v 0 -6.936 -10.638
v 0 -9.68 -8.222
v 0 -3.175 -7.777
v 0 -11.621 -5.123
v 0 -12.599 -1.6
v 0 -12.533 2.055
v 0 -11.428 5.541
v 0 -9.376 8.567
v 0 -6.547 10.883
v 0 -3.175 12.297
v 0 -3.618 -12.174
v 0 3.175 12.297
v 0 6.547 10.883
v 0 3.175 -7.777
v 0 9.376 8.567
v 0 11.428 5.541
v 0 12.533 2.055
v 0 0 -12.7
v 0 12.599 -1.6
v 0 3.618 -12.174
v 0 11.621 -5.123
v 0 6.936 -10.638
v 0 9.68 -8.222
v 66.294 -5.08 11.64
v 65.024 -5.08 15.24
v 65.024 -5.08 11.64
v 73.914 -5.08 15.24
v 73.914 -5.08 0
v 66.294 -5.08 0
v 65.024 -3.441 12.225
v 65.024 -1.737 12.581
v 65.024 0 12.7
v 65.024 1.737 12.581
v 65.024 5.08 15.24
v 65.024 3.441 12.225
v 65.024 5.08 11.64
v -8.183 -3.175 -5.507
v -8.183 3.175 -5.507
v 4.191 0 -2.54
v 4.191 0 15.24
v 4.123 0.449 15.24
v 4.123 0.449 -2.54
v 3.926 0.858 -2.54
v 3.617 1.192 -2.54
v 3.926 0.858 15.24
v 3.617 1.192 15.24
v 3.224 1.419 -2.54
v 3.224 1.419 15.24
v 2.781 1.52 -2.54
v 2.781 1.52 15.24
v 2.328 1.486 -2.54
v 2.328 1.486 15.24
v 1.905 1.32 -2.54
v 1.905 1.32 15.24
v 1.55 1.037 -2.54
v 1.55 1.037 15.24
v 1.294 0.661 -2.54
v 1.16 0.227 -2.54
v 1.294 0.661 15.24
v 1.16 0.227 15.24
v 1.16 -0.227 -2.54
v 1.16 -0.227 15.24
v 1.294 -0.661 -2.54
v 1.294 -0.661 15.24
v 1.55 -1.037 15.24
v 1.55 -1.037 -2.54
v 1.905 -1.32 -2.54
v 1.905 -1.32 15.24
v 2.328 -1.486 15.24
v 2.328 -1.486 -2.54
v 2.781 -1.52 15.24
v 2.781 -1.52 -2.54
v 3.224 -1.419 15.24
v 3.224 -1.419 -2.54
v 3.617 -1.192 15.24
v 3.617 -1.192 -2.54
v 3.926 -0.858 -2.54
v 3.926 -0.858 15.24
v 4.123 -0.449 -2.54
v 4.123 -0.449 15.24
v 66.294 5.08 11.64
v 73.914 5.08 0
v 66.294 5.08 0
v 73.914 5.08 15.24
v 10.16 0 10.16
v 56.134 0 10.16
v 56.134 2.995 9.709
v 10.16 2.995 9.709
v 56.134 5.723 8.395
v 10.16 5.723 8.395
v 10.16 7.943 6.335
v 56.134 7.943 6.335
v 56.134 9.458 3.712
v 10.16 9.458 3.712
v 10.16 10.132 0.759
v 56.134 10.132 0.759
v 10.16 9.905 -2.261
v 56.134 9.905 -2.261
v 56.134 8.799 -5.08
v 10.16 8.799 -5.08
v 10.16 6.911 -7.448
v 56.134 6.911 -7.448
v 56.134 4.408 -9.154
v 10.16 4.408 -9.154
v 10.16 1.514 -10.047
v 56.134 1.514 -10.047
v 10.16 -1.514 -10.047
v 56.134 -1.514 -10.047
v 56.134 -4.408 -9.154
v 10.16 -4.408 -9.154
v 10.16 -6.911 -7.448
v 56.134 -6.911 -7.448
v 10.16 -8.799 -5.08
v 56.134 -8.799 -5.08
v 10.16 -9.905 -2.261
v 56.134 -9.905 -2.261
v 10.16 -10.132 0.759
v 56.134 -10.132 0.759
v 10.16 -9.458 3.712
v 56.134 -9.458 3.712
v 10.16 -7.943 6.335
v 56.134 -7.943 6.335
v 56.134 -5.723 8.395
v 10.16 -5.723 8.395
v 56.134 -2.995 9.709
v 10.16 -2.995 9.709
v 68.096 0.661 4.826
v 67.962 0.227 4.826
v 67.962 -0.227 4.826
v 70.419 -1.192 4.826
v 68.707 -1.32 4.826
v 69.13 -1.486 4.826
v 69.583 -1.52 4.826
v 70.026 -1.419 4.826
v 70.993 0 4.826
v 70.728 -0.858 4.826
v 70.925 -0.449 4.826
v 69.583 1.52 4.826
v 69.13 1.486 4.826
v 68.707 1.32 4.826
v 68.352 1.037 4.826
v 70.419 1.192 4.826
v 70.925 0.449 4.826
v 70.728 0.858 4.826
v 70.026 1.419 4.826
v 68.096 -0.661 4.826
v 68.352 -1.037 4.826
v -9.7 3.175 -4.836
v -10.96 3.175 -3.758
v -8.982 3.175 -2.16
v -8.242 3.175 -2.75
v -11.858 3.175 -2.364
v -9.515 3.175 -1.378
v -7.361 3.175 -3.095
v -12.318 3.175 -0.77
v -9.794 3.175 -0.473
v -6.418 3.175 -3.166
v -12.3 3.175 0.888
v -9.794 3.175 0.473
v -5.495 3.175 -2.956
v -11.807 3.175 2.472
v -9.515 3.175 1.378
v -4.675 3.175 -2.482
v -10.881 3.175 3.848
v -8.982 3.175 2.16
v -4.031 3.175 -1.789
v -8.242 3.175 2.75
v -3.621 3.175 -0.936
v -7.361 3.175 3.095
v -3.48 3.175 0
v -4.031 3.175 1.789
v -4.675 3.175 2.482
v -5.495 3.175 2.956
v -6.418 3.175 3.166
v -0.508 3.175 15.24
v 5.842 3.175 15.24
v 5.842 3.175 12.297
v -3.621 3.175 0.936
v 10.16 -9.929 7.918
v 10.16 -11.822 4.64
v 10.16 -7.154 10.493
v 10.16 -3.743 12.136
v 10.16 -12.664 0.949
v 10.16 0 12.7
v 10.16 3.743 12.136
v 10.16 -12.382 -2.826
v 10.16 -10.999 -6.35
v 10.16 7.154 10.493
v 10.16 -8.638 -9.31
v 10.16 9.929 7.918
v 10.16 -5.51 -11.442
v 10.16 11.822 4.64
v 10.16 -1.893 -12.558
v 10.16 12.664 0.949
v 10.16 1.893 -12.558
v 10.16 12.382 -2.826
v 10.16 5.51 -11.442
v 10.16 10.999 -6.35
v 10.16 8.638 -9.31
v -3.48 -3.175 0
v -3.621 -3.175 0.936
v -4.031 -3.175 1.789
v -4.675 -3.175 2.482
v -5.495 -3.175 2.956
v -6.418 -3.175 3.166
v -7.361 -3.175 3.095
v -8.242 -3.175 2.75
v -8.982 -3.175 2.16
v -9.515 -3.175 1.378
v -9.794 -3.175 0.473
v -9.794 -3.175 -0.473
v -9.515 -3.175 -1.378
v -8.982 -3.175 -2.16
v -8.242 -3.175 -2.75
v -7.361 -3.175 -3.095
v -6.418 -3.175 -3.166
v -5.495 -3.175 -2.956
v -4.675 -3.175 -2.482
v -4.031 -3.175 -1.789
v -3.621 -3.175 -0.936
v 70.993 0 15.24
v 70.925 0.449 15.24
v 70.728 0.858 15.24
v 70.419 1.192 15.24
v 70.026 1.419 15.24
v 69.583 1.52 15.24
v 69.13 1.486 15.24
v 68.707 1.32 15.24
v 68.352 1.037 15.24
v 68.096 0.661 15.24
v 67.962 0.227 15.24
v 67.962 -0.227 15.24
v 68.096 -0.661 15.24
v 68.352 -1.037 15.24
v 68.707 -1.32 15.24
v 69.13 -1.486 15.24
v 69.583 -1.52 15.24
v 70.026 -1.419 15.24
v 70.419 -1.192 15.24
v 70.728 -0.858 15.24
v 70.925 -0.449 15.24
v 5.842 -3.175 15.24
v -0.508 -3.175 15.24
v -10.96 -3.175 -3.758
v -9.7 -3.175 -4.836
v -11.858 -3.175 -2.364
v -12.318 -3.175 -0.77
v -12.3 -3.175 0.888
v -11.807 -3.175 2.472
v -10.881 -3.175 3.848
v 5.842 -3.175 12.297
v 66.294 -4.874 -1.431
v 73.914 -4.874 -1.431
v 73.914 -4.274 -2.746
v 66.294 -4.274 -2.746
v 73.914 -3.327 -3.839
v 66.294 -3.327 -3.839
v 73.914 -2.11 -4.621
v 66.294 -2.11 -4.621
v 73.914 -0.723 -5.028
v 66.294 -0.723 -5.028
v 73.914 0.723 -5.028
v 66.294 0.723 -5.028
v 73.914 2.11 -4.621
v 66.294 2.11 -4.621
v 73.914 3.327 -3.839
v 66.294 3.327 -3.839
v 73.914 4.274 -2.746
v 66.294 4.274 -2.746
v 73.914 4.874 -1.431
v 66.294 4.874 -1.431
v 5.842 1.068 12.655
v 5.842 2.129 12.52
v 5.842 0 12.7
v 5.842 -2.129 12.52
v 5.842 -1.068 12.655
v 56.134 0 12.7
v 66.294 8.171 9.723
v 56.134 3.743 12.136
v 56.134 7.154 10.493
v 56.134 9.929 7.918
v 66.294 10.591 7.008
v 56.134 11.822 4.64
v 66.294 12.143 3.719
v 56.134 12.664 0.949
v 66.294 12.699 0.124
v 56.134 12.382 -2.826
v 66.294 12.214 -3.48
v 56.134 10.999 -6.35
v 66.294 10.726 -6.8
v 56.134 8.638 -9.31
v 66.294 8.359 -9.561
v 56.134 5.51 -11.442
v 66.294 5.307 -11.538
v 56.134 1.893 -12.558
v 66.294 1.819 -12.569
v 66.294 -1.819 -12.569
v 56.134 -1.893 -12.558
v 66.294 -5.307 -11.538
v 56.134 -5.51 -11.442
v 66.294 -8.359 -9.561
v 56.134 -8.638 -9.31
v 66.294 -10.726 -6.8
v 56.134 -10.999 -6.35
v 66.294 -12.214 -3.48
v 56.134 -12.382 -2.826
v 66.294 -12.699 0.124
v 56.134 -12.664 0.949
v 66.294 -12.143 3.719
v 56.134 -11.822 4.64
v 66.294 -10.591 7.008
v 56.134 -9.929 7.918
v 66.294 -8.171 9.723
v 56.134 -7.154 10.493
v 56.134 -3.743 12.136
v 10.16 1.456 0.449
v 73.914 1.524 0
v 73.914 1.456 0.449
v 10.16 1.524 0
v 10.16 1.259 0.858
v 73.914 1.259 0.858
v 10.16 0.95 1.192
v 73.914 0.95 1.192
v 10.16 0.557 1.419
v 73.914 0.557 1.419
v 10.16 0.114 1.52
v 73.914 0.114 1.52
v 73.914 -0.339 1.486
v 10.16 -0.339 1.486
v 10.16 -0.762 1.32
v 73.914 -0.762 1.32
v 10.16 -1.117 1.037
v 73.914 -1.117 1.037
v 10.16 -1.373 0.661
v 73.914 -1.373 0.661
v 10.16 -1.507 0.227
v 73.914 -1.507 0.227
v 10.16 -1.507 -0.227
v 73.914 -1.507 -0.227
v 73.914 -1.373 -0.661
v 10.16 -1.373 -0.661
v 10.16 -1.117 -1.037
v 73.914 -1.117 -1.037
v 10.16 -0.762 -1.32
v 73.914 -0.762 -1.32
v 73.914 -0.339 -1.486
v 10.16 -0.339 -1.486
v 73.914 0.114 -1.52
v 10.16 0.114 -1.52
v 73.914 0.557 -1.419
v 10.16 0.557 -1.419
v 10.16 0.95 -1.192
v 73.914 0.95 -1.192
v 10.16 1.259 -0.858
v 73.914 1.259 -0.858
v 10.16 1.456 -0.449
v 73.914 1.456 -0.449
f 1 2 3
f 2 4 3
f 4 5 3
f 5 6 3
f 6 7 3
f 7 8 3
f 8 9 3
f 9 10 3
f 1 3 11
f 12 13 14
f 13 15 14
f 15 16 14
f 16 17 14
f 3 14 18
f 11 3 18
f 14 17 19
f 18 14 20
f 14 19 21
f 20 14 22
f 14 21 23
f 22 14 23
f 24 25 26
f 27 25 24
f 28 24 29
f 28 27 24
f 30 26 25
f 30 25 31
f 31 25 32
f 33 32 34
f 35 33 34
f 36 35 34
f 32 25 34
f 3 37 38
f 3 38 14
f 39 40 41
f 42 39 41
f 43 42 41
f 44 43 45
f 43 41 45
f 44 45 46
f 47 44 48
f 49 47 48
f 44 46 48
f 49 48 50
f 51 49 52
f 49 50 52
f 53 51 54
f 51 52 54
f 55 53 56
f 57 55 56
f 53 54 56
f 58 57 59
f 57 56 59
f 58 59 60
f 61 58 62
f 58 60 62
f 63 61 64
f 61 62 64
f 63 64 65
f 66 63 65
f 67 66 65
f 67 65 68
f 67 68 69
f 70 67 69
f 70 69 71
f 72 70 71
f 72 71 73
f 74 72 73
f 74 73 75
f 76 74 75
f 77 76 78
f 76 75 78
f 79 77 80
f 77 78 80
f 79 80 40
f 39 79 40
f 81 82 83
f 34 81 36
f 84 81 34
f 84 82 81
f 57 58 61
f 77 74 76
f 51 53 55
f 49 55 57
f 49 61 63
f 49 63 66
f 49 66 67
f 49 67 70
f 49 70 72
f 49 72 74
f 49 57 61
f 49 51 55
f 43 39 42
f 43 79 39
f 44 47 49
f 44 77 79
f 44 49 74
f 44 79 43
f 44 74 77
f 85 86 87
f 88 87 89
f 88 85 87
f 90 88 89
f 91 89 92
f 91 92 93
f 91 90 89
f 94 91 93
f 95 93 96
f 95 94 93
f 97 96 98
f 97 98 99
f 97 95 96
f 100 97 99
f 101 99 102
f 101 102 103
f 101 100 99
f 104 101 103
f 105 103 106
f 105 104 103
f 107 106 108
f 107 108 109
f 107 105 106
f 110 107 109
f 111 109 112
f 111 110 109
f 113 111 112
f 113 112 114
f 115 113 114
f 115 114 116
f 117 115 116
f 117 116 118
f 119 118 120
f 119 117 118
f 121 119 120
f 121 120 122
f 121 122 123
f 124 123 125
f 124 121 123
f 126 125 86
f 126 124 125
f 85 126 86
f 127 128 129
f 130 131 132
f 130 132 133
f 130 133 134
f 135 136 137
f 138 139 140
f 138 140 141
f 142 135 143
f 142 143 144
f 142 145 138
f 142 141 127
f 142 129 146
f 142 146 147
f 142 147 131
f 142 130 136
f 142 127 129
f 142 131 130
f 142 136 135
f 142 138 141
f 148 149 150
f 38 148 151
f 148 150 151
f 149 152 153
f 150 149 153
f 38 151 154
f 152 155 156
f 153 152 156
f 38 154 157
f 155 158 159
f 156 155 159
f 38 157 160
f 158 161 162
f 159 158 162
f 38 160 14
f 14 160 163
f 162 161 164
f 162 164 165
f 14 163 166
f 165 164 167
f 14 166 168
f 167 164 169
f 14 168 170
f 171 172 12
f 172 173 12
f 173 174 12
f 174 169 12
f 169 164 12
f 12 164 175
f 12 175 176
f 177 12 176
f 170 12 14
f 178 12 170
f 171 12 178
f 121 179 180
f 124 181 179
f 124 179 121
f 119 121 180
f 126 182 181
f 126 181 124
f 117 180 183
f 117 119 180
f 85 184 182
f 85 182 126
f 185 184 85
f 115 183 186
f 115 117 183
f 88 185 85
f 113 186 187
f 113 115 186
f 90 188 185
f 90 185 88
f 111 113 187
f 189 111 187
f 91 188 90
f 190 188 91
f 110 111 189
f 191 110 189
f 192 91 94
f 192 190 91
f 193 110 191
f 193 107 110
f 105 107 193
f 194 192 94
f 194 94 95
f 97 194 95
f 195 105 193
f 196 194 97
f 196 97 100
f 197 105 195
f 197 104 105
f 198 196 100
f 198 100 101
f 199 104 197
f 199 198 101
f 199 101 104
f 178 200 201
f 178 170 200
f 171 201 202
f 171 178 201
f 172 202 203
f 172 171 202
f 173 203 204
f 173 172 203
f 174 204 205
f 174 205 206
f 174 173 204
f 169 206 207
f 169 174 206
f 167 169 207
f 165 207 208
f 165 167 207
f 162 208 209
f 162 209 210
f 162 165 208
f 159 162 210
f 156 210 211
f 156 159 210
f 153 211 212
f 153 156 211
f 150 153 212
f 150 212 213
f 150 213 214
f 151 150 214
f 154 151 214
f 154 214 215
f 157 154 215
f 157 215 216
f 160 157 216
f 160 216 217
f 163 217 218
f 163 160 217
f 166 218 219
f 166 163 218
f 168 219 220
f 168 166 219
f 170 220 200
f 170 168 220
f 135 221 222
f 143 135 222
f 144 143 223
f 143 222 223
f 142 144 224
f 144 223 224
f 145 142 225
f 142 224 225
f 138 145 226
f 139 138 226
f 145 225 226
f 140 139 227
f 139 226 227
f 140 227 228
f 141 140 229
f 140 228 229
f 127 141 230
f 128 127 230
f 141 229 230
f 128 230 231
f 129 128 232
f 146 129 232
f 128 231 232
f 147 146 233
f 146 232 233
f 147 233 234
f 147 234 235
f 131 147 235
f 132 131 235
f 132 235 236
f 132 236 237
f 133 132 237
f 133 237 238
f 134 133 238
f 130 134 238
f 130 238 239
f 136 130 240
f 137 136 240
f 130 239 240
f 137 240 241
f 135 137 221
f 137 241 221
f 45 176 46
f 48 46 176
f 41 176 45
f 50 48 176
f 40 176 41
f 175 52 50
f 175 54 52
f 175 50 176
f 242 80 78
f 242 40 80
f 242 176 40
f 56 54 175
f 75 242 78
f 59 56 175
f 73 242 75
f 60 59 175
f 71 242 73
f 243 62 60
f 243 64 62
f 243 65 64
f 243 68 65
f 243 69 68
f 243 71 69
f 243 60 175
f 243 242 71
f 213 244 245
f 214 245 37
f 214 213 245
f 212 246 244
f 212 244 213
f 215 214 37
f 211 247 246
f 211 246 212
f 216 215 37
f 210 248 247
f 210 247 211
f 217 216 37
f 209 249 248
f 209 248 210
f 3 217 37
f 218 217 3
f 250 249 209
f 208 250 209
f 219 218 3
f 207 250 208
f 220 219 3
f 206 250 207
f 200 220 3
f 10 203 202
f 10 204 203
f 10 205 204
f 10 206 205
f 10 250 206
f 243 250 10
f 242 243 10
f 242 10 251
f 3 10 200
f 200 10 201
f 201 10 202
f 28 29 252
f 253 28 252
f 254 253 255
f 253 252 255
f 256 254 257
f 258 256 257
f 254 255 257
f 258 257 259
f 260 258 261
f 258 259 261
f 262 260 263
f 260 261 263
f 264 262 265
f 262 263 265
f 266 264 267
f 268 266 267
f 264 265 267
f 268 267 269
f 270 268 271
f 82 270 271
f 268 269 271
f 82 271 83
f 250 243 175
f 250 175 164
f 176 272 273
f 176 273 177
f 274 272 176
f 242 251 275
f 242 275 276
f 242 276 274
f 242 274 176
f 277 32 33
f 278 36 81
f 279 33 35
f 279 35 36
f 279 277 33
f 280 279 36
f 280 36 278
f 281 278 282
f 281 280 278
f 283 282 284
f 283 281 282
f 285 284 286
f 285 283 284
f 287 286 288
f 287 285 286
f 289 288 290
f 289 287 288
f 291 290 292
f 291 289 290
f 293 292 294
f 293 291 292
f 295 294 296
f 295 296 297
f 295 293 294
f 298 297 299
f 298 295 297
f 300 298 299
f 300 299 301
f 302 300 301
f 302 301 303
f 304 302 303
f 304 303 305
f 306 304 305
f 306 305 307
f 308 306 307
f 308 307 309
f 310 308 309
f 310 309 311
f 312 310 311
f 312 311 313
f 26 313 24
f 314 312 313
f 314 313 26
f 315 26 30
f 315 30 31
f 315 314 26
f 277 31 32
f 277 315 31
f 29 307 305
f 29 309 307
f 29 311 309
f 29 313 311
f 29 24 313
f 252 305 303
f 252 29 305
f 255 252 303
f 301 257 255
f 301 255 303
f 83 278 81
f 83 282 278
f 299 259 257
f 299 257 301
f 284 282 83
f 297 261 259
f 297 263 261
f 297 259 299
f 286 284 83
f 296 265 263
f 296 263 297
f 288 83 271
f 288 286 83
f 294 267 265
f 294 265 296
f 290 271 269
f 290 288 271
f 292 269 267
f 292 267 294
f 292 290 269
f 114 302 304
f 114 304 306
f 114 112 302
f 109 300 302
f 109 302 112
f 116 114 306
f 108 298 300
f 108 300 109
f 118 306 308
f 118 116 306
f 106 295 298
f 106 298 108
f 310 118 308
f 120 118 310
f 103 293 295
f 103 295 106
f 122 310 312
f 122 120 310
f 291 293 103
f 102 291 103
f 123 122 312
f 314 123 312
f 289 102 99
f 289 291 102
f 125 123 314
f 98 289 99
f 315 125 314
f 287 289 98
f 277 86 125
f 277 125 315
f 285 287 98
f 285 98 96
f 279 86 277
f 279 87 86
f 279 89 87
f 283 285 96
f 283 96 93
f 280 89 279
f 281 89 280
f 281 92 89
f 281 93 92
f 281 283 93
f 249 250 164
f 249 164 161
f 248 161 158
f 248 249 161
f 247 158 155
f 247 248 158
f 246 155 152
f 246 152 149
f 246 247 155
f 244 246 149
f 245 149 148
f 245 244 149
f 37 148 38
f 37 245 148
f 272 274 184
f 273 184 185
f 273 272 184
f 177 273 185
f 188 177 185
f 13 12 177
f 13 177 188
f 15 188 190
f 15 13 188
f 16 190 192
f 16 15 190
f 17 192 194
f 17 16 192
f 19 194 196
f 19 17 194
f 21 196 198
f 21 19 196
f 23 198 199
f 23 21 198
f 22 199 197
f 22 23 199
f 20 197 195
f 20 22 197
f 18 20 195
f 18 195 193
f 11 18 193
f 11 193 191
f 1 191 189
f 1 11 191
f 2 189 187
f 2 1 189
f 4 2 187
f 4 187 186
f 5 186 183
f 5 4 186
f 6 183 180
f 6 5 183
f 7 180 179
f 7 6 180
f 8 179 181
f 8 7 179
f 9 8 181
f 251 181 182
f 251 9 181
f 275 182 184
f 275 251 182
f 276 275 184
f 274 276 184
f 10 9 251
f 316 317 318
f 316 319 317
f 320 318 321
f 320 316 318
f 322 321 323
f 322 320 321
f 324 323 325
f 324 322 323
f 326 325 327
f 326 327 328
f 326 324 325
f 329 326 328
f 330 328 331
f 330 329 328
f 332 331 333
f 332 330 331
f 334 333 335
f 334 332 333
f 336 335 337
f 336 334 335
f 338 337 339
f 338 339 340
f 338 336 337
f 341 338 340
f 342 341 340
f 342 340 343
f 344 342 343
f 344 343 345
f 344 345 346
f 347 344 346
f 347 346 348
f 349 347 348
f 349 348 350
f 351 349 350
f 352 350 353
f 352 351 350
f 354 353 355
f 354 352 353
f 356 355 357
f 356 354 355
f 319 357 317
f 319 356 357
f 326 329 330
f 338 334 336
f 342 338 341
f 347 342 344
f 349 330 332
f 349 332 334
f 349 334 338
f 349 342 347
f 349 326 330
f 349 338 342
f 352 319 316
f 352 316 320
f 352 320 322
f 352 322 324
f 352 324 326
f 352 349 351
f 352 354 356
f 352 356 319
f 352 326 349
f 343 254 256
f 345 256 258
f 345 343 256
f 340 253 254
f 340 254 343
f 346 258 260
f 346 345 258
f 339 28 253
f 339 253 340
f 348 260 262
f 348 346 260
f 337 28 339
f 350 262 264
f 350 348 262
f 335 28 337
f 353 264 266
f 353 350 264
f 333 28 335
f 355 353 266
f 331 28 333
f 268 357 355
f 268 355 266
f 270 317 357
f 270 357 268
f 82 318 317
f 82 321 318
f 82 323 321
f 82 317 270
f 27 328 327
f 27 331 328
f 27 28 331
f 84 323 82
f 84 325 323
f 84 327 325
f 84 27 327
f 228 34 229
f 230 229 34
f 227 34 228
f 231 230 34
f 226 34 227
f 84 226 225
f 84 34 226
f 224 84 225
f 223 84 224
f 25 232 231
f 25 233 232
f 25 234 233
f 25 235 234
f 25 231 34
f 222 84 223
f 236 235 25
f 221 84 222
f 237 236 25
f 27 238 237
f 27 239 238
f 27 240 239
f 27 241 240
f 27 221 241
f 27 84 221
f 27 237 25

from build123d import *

# Parameters (mm, degrees)
F0_W     = 5.842
F0_H     = 12.7
F0_R     = 3.175
F2_DEPTH = 3.175
F3_R     = 1.524
F4_DEPTH = 7.62
F5_DEPTH = 1.27
F6_DEPTH = 56.134
F7_R     = 1.524
F8_DEPTH = 17.78
F9_DEPTH = 10.414


with BuildPart() as f1:
    # F0 (on Front) → F1 (revolve)
    with BuildSketch(Plane.XZ):
        with Locations((2.921, 6.35)):
            Rectangle(F0_W, F0_H)
        Polygon((5.842, 12.7), (5.842, 0), (66.294, 0), (66.294, 12.7), (56.134, 12.7), (56.134, 10.16), (10.16, 10.16), (10.16, 12.7), align=None)
    revolve(axis=Axis((33.147, 0, 0), (-1, 0, 0)))

    # F0 (on Front) → F2 (join, symmetric)
    with BuildSketch(Plane.XZ):
        with BuildLine():
            Line((-0.9398, 0), (0, 0))
            Line((0, 0), (0, 12.7))
            Line((0, 12.7), (5.842, 12.7))
            Line((5.842, 12.7), (5.842, 15.24))
            Line((5.842, 15.24), (-0.508, 15.24))
            Line((-0.508, 15.24), (-10.8806298187, 3.8475430269))
            ThreePointArc((-10.8806298187, 3.8475430269), (-4.5919612295, 5.3297205562), (-0.9398, 0))
        make_face()
        with BuildLine():
            ThreePointArc((-8.1826630726, -5.5069827884), (-3.1957909266, -4.5493385486), (-0.9398, 0))
            ThreePointArc((-0.9398, 0), (-4.5919612295, 5.3297205562), (-10.8806298187, 3.8475430269))
            ThreePointArc((-10.8806298187, 3.8475430269), (-12.1459778134, -1.5837270034), (-8.1826630726, -5.5069827884))
        make_face()
        with Locations((-6.6548, 0)):
            Circle(F0_R, mode=Mode.SUBTRACT)
        with BuildLine():
            Line((5.842, 0), (0, 0))
            Line((0, 0), (-0.9398, 0))
            ThreePointArc((-0.9398, 0), (-3.1957909266, -4.5493385486), (-8.1826630726, -5.5069827884))
            Line((-8.1826630726, -5.5069827884), (5.842, -9.398))
            Line((5.842, -9.398), (5.842, 0))
        make_face()
        with Locations((2.921, 6.35)):
            Rectangle(F0_W, F0_H)
    extrude(amount=F2_DEPTH, both=True)

    # F3 (on face) → F4 (join)
    with BuildSketch(Plane.YZ.offset(66.294)):
        with BuildLine():
            ThreePointArc((-5.08, 0), (0, -5.08), (5.08, 0))
            ThreePointArc((5.08, 0), (0, 5.08), (-5.08, 0))
        make_face()
        Circle(F3_R, mode=Mode.SUBTRACT)
        with BuildLine():
            ThreePointArc((-5.08, 0), (0, 5.08), (5.08, 0))
            Line((5.08, 0), (5.08, 11.6397422652))
            ThreePointArc((5.08, 11.6397422652), (0, 12.7), (-5.08, 11.6397422652))
            Line((-5.08, 11.6397422652), (-5.08, 0))
        make_face()
        with BuildLine():
            ThreePointArc((-5.08, 11.6397422652), (0, 12.7), (5.08, 11.6397422652))
            Line((5.08, 11.6397422652), (5.08, 15.24))
            Line((5.08, 15.24), (-5.08, 15.24))
            Line((-5.08, 15.24), (-5.08, 11.6397422652))
        make_face()
    extrude(amount=F4_DEPTH)

    # F5 (add): a face of the model
    f5_faces = [f1.faces().sort_by_distance(p)[0] for p in [
        (66.294, 0, 13.7792682875),
    ]]
    extrude(f5_faces, amount=F5_DEPTH)

    # F6 (cut, through all): a face of the model
    f6_faces = [f1.faces().sort_by_distance(p)[0] for p in [
        (66.294, 0, 0),
    ]]
    extrude(f6_faces, amount=-F6_DEPTH, mode=Mode.SUBTRACT)

    # F7 (on face) → F8 (cut)
    with BuildSketch(Plane.XY.offset(15.24)):
        with Locations((2.667, 0)):
            Circle(F7_R)
    extrude(amount=-F8_DEPTH, mode=Mode.SUBTRACT)

    # F7 (on face) → F9 (cut)
    with BuildSketch(Plane.XY.offset(15.24)):
        with Locations((69.469, 0)):
            Circle(F7_R)
    extrude(amount=-F9_DEPTH, mode=Mode.SUBTRACT)


solid = f1.part
